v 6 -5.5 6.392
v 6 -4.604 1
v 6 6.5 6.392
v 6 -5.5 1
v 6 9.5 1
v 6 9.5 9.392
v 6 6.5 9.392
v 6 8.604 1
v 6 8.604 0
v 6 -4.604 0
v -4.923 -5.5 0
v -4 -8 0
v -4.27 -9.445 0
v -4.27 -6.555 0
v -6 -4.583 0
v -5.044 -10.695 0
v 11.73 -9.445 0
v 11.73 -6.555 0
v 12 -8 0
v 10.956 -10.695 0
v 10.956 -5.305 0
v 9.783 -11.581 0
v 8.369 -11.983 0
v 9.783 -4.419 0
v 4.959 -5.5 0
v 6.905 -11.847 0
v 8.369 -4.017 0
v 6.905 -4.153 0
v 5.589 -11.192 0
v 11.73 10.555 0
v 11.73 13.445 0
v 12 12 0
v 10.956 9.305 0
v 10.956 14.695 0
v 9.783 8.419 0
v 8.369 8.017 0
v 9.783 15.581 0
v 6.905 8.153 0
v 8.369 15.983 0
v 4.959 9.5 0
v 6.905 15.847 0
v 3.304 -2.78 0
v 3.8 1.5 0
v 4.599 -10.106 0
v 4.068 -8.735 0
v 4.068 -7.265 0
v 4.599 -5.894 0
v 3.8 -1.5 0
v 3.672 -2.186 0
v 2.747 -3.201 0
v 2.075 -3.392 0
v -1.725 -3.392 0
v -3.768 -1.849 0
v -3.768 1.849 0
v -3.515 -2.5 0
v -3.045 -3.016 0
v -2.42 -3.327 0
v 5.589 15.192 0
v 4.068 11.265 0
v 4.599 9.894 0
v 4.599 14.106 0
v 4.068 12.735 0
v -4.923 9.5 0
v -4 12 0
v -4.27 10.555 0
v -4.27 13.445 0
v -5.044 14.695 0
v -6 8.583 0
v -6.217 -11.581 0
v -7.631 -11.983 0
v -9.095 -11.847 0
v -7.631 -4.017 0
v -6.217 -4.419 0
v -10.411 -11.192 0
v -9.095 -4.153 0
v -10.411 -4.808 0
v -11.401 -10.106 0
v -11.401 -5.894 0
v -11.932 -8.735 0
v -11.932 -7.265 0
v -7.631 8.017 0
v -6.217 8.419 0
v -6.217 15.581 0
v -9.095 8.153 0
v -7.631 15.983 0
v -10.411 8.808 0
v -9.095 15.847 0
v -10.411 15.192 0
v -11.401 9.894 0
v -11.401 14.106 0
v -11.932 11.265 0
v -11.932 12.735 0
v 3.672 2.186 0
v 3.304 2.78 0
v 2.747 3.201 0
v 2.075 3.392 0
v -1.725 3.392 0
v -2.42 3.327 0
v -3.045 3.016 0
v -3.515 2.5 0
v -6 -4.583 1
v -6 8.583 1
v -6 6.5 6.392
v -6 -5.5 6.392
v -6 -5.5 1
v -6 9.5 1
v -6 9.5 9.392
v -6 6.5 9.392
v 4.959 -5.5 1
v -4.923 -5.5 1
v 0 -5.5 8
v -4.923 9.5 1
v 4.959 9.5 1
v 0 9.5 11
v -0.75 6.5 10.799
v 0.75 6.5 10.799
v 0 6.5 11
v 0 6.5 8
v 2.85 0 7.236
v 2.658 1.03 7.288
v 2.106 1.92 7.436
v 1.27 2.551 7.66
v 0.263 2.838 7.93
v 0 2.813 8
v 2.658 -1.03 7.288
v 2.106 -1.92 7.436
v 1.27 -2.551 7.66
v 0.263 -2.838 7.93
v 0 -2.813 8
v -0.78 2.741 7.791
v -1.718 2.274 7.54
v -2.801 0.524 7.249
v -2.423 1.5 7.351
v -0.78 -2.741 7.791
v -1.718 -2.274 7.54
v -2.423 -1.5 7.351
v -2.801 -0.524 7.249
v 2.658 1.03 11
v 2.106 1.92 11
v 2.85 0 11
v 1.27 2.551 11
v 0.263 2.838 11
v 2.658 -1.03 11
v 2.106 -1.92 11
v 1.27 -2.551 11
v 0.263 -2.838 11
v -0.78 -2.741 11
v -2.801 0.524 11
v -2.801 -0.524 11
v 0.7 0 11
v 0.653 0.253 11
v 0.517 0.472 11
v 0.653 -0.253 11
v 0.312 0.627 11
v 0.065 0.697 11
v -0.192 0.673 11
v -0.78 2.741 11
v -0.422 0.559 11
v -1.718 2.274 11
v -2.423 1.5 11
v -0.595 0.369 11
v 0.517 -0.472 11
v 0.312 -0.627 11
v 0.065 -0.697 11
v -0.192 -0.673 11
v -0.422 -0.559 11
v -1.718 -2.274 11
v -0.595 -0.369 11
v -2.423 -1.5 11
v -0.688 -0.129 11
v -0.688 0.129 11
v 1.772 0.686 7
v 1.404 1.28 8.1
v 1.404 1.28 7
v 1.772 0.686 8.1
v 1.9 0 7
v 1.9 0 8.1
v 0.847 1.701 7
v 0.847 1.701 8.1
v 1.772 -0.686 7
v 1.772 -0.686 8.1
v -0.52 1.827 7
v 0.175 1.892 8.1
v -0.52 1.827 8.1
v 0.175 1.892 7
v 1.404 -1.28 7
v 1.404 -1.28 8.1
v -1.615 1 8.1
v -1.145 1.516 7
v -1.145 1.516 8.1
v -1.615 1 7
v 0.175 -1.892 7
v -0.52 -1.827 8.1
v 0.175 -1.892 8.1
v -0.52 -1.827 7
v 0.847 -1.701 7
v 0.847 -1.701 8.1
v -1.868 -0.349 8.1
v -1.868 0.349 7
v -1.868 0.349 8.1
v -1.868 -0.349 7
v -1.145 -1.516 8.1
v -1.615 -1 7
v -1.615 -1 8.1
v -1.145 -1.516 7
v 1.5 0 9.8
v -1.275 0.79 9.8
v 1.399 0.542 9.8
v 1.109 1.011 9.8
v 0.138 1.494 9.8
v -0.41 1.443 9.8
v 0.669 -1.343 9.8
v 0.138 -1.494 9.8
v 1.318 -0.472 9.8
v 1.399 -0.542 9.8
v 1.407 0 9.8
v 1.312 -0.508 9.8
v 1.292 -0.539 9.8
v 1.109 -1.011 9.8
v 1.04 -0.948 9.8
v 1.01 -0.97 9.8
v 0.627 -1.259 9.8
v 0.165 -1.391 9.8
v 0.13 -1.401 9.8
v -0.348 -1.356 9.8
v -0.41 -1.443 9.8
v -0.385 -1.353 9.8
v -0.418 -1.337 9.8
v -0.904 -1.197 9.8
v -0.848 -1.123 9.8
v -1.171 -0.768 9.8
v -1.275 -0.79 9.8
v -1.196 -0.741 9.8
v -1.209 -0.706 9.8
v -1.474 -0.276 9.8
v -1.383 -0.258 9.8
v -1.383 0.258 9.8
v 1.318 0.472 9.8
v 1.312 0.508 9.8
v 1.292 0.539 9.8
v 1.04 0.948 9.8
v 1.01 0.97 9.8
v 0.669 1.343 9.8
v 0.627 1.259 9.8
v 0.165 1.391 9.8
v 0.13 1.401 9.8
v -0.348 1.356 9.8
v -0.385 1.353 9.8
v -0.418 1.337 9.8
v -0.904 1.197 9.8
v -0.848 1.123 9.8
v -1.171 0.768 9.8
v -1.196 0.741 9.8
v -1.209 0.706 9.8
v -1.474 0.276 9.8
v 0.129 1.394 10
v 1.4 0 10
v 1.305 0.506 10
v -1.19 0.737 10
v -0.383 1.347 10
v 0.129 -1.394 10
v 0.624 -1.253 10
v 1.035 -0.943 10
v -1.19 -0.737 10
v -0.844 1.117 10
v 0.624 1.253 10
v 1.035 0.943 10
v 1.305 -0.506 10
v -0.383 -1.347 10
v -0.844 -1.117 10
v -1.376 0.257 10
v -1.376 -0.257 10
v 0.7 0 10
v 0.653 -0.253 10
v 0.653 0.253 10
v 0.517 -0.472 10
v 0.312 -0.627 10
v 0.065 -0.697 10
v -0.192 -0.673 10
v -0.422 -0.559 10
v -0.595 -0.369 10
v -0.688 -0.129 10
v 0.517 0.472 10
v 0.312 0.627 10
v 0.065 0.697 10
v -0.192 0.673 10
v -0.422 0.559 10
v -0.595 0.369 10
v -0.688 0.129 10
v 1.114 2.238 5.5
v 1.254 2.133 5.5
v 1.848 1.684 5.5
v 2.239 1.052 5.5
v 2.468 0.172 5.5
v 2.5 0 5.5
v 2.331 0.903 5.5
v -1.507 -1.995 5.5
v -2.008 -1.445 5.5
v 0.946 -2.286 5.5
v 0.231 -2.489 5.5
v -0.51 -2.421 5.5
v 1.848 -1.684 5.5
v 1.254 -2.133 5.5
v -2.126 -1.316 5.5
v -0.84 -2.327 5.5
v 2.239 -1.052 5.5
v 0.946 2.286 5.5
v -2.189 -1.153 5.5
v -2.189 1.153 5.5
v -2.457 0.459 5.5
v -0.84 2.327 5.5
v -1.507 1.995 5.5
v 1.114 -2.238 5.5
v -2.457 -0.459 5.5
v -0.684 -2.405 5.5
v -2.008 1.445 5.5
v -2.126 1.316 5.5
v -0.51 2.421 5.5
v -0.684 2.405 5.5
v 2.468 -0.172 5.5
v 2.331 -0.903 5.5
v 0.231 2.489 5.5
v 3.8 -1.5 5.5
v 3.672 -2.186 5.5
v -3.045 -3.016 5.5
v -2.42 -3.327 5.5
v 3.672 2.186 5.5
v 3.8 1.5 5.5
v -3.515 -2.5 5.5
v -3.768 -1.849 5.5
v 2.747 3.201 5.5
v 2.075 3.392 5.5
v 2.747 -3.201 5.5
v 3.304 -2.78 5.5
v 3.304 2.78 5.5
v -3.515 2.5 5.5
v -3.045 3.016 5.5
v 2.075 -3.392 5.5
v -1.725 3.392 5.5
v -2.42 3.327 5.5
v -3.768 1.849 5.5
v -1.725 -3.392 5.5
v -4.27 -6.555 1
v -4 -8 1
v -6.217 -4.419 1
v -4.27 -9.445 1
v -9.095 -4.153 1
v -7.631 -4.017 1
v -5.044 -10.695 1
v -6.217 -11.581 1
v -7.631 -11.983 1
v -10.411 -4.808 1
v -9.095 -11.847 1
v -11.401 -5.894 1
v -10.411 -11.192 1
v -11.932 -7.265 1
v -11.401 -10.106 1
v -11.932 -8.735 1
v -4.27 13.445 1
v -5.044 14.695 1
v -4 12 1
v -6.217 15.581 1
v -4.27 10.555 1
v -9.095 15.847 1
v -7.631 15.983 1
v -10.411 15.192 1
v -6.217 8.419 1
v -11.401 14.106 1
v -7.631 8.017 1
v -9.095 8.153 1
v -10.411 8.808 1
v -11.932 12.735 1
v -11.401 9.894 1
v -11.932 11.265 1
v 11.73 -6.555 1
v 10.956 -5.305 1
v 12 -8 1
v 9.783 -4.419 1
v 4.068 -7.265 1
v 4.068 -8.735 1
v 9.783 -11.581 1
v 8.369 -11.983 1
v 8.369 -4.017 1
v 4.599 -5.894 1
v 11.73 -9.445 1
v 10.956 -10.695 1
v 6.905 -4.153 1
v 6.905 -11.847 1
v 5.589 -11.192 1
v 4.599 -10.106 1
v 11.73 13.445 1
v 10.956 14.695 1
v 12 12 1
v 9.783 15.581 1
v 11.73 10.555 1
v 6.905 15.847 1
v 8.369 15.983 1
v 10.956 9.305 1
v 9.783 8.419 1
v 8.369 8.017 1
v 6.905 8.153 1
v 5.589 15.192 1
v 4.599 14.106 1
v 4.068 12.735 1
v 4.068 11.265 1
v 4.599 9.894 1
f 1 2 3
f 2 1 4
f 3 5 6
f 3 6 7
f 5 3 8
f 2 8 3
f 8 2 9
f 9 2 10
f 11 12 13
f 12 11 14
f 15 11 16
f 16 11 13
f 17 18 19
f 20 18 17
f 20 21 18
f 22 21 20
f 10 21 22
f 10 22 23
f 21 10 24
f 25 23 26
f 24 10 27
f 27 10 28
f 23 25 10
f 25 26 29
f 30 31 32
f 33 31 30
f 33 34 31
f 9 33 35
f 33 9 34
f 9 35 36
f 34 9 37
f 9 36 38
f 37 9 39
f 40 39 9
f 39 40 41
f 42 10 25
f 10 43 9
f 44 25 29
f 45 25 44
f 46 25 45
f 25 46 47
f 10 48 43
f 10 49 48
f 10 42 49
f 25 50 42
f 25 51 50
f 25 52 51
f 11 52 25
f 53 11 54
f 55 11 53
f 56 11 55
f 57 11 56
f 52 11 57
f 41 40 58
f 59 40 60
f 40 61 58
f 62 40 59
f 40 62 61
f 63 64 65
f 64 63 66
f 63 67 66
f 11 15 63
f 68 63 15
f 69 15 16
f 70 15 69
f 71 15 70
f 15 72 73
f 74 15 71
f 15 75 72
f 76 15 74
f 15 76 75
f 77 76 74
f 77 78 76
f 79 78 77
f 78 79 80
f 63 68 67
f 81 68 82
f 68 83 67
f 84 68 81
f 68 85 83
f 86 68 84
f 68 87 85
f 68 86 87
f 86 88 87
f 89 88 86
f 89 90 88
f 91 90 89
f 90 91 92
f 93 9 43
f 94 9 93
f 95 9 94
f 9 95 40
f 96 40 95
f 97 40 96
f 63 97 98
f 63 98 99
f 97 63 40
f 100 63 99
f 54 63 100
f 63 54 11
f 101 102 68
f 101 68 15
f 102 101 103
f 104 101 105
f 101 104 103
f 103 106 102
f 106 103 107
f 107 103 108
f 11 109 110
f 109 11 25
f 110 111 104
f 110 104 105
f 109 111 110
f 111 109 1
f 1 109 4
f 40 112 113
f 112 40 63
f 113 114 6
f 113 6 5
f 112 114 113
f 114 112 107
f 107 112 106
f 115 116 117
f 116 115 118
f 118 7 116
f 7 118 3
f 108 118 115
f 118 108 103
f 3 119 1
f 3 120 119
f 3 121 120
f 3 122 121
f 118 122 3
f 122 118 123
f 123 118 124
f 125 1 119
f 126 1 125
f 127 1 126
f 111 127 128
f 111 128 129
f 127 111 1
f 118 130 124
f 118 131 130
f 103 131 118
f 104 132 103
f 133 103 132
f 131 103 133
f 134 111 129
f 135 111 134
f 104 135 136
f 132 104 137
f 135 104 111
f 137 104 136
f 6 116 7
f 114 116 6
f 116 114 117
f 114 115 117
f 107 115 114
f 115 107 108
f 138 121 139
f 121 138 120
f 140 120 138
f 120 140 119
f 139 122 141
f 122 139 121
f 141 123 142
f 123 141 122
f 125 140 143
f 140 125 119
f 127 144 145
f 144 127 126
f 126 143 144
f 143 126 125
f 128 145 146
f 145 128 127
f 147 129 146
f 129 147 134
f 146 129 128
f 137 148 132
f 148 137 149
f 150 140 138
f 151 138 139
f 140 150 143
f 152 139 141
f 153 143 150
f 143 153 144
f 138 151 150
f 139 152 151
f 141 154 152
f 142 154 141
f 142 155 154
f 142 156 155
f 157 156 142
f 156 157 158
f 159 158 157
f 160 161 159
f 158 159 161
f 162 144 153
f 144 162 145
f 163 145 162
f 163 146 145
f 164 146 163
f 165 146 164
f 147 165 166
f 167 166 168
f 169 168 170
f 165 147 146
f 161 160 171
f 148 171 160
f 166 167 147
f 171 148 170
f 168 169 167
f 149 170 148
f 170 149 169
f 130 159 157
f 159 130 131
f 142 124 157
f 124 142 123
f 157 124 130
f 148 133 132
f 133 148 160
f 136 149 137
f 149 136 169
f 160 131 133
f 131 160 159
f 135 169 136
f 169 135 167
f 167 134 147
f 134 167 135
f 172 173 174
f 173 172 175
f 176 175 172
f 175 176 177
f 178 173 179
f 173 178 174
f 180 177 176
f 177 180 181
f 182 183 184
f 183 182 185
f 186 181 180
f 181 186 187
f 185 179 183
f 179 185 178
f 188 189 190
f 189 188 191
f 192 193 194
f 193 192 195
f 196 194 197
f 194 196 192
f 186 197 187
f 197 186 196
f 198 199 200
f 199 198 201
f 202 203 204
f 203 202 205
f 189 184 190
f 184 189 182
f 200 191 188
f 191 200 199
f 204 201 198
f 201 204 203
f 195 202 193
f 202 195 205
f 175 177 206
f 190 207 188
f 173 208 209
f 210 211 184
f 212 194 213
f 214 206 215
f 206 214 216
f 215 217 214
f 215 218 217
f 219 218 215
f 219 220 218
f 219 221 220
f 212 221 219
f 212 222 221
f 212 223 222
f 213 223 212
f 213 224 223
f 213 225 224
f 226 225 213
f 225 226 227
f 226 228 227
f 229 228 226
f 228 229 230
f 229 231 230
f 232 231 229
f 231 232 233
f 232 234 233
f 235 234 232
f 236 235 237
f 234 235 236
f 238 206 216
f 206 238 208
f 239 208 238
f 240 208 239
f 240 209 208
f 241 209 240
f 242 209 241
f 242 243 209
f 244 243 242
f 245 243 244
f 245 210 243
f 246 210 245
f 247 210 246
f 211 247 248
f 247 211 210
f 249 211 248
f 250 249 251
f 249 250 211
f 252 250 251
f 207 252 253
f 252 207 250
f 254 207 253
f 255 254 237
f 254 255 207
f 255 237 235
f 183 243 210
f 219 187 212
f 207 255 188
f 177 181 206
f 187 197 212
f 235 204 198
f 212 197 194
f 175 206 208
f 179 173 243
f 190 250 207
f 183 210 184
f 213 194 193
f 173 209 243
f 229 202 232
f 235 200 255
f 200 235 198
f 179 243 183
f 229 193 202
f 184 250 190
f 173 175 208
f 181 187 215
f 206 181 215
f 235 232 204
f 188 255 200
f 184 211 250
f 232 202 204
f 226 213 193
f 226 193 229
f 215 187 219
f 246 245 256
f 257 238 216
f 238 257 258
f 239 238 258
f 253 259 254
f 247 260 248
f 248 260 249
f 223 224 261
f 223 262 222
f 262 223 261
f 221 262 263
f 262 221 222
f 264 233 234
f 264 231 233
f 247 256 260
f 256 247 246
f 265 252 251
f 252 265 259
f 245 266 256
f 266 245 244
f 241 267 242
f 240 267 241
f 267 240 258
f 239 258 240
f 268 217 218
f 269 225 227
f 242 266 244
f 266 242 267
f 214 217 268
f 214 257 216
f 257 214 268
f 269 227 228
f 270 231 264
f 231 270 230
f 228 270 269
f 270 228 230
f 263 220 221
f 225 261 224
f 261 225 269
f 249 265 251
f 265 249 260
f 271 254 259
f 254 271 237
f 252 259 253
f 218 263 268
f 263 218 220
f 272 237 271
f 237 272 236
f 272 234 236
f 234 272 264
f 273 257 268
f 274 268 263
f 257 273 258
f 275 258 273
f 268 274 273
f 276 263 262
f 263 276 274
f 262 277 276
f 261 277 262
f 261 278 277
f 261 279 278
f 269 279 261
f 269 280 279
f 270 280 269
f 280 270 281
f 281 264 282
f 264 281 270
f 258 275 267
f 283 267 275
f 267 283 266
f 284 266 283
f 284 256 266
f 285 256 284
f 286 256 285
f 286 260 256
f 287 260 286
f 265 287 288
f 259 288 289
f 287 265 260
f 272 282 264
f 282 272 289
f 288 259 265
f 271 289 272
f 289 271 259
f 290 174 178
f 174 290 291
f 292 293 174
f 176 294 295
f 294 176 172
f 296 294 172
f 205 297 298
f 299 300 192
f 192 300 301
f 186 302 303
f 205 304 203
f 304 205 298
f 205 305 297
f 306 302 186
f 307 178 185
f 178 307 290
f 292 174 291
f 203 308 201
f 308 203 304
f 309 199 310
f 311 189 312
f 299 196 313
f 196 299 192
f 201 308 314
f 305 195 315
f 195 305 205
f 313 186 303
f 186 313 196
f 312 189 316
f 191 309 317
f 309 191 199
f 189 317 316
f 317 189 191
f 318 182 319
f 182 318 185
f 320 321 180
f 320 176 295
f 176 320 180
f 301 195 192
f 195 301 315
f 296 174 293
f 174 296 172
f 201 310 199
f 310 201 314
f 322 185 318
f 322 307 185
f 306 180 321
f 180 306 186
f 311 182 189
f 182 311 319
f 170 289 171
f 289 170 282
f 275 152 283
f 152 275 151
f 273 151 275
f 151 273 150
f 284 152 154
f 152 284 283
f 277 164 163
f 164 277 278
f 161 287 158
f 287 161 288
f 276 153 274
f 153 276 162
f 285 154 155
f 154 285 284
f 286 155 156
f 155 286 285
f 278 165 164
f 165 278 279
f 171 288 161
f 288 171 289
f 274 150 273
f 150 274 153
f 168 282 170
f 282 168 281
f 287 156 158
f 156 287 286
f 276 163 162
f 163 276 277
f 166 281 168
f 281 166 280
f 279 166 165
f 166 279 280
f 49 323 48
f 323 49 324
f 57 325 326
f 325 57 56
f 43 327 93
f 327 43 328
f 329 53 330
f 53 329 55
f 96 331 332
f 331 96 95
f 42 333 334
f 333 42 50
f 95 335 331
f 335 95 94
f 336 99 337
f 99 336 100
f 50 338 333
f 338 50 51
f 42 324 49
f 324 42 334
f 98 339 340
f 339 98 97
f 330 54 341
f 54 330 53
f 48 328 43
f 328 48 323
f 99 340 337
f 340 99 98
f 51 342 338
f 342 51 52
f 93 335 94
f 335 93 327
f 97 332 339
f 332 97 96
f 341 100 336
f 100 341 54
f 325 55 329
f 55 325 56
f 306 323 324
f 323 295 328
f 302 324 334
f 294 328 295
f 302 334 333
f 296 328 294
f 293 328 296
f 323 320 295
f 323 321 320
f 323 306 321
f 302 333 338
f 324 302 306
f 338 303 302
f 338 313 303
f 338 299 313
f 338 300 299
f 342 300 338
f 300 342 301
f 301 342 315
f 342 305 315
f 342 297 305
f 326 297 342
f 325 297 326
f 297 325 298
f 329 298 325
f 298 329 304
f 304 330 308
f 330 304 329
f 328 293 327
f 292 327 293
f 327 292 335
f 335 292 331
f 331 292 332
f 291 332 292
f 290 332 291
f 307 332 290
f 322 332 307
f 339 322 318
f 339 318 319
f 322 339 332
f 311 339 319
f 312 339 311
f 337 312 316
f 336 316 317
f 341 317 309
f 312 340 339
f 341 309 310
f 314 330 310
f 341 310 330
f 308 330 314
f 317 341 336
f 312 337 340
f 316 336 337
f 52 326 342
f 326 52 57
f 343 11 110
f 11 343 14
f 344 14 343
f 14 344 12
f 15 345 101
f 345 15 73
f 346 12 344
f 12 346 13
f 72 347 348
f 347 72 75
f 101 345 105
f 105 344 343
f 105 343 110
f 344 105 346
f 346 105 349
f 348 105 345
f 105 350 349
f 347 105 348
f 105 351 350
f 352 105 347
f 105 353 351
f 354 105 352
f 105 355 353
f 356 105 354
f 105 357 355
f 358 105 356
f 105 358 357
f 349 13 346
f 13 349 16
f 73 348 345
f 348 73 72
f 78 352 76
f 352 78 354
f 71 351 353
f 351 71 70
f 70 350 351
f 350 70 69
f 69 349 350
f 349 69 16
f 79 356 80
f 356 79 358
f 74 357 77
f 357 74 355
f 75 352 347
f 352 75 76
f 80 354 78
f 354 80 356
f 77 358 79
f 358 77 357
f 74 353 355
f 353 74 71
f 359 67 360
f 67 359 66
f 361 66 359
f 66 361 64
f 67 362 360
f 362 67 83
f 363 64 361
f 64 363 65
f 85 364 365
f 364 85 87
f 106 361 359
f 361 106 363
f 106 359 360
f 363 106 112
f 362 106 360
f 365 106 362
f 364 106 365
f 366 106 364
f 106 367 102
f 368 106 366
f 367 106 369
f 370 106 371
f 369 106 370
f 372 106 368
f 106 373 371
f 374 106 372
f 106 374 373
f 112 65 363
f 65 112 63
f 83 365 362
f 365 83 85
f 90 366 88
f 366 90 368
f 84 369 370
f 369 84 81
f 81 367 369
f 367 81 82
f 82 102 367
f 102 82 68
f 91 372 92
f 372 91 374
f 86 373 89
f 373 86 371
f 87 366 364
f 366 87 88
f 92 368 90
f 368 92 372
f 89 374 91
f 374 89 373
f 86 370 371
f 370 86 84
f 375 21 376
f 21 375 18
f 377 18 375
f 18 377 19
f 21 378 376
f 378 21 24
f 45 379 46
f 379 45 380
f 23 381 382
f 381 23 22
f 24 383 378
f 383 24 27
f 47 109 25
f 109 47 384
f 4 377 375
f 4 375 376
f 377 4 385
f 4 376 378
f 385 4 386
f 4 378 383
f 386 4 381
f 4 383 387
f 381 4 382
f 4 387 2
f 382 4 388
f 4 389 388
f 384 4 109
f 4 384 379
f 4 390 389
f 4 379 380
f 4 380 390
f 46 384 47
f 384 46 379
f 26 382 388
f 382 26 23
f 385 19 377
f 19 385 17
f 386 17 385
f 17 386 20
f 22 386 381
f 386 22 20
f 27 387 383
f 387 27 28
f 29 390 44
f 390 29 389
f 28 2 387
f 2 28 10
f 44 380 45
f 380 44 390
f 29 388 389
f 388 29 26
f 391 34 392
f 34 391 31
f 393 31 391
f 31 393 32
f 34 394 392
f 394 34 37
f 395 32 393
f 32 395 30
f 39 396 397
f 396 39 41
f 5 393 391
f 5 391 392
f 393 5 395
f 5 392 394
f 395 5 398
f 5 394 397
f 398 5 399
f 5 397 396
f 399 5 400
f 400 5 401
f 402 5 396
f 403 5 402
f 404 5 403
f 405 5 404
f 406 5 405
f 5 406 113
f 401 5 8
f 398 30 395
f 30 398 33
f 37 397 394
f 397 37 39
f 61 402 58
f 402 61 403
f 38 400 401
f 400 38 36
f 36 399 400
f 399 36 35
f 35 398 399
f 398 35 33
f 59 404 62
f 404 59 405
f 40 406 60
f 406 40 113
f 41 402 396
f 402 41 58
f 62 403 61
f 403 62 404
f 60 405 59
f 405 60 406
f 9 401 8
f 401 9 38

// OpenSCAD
thickness = 8;
angle = 15;
space = .4;
$fn = 17;

render() difference(){
    union(){
        cylinder(r = 2.85, h = thickness + 3);
        difference(){
            union(){
                translate([-6, -5.5, 0])
                    cube([12, 12.25, thickness]);
                translate([-6, 6.5, 0])
                    cube([12, 3, thickness + 3]);
            }
            translate([0, -5.75, thickness])
                rotate([0, angle, 0])
                    cube([12, 12.25, thickness]);
            translate([0, -5.75, thickness])
                rotate([0, -angle, 0])
                    translate([-12, 0, 0])
                        cube([12, 12.25, thickness]);
            translate([0, 6.5, thickness + 3])
                rotate([0, angle, 0])
                    cube([12, 3, thickness]);
            translate([0, 6.5, thickness + 3])
                rotate([0, -angle, 0])
                    translate([-12, 0, 0])
                        cube([12, 3, thickness]);
            
        }
        
    }
    
    cylinder(r = .3 + space, h = thickness + 3);
    difference(){
        intersection(){
            minkowski(){
            cube([3.8, 3, 9], true);
            cylinder(h = 1, r=1.5 + space);
            }
        }
    }
    translate([0, 0, 5]){
    cylinder(r1 = 2.3 + space, r2 = 1.5 + space, h = 2);
        translate([0, 0, 2]){
            cylinder(h = 1.1, r1 = 1.5 + space, r2 = 1.5 + space);
            translate([0, 0, 1.1]) 
                cylinder(h = 1.7, r1 = 1.5 + space, r2 = 1.1 + space);
            cylinder(h = 3, r1 = 1.1 + space, r2 = 1 + space);
        }
    }
}

//feet
translate([-8, -8, 0])
    cylinder(r = 4, h = 1);
translate([-8, 12, 0])
    cylinder(r = 4, h = 1);
translate([8, -8, 0])
    cylinder(r = 4, h = 1);
translate([8, 12, 0])
    cylinder(r = 4, h = 1);

//translate([0, 0, -8.])
//    rotate([0, 90, 0])
//        needle();

module needle(){
$fn = 20;
    rotate([0, -90, 0]){
        render() difference(){
            union(){
                translate([0, 0, .4])
                minkowski(){
                    cube([3.8, 3, .8], true);
                    cylinder(h = .1, r=1.5);
                }
                cylinder(h = 5, r=2.8);    
                translate([0, 0, 9]){
                    difference(){
                        intersection(){
                            minkowski(){
                            cube([3.8, 3, 10], true);
                                
                            cylinder(h = 1, r=1.5);
                            }
                            translate([0, 0, 2])
                            sphere(r = 7, $fn = 40);
                        }
                        translate([0, 0, 9]){
                            rotate_extrude(angle = 360){
                                translate([5.4, 0, 0])
                                    scale([.8, 1.1, 1])
                                        circle(r = 6, $fn = 40);
                            }
                        }
                    }
                }
                translate([0, 0, 15]){
                        cylinder(h = 1.1, r1 = 1.5, r2 = 1.5);
                        translate([0, 0, 1.1]) 
                            cylinder(h = 1.7, r1 = 1.5, r2 = 1.1);
                        cylinder(h = 3, r1 = 1.1, r2 = 1);
                    }
                //needle
                cylinder(h = 70, r = .3);
            }
            translate([-7, 0, 0]){
                cylinder(h = 15, r = 3.9, $fn = 40);
            }
            translate([7, 0, 0]){
                cylinder(h = 15, r = 3.9, $fn = 40);
            }
            cylinder(h = 7, r = 2.1);
            translate([0, 0, 7]){
                cylinder(h = 2, r1 = 2.1, r2 = .5);
                translate([0, 0, 2])
                    cylinder(h = 5, r1 = .5, r2 = .25);
            }
            cylinder(h = 70, r = .2);
        }
    }
}
